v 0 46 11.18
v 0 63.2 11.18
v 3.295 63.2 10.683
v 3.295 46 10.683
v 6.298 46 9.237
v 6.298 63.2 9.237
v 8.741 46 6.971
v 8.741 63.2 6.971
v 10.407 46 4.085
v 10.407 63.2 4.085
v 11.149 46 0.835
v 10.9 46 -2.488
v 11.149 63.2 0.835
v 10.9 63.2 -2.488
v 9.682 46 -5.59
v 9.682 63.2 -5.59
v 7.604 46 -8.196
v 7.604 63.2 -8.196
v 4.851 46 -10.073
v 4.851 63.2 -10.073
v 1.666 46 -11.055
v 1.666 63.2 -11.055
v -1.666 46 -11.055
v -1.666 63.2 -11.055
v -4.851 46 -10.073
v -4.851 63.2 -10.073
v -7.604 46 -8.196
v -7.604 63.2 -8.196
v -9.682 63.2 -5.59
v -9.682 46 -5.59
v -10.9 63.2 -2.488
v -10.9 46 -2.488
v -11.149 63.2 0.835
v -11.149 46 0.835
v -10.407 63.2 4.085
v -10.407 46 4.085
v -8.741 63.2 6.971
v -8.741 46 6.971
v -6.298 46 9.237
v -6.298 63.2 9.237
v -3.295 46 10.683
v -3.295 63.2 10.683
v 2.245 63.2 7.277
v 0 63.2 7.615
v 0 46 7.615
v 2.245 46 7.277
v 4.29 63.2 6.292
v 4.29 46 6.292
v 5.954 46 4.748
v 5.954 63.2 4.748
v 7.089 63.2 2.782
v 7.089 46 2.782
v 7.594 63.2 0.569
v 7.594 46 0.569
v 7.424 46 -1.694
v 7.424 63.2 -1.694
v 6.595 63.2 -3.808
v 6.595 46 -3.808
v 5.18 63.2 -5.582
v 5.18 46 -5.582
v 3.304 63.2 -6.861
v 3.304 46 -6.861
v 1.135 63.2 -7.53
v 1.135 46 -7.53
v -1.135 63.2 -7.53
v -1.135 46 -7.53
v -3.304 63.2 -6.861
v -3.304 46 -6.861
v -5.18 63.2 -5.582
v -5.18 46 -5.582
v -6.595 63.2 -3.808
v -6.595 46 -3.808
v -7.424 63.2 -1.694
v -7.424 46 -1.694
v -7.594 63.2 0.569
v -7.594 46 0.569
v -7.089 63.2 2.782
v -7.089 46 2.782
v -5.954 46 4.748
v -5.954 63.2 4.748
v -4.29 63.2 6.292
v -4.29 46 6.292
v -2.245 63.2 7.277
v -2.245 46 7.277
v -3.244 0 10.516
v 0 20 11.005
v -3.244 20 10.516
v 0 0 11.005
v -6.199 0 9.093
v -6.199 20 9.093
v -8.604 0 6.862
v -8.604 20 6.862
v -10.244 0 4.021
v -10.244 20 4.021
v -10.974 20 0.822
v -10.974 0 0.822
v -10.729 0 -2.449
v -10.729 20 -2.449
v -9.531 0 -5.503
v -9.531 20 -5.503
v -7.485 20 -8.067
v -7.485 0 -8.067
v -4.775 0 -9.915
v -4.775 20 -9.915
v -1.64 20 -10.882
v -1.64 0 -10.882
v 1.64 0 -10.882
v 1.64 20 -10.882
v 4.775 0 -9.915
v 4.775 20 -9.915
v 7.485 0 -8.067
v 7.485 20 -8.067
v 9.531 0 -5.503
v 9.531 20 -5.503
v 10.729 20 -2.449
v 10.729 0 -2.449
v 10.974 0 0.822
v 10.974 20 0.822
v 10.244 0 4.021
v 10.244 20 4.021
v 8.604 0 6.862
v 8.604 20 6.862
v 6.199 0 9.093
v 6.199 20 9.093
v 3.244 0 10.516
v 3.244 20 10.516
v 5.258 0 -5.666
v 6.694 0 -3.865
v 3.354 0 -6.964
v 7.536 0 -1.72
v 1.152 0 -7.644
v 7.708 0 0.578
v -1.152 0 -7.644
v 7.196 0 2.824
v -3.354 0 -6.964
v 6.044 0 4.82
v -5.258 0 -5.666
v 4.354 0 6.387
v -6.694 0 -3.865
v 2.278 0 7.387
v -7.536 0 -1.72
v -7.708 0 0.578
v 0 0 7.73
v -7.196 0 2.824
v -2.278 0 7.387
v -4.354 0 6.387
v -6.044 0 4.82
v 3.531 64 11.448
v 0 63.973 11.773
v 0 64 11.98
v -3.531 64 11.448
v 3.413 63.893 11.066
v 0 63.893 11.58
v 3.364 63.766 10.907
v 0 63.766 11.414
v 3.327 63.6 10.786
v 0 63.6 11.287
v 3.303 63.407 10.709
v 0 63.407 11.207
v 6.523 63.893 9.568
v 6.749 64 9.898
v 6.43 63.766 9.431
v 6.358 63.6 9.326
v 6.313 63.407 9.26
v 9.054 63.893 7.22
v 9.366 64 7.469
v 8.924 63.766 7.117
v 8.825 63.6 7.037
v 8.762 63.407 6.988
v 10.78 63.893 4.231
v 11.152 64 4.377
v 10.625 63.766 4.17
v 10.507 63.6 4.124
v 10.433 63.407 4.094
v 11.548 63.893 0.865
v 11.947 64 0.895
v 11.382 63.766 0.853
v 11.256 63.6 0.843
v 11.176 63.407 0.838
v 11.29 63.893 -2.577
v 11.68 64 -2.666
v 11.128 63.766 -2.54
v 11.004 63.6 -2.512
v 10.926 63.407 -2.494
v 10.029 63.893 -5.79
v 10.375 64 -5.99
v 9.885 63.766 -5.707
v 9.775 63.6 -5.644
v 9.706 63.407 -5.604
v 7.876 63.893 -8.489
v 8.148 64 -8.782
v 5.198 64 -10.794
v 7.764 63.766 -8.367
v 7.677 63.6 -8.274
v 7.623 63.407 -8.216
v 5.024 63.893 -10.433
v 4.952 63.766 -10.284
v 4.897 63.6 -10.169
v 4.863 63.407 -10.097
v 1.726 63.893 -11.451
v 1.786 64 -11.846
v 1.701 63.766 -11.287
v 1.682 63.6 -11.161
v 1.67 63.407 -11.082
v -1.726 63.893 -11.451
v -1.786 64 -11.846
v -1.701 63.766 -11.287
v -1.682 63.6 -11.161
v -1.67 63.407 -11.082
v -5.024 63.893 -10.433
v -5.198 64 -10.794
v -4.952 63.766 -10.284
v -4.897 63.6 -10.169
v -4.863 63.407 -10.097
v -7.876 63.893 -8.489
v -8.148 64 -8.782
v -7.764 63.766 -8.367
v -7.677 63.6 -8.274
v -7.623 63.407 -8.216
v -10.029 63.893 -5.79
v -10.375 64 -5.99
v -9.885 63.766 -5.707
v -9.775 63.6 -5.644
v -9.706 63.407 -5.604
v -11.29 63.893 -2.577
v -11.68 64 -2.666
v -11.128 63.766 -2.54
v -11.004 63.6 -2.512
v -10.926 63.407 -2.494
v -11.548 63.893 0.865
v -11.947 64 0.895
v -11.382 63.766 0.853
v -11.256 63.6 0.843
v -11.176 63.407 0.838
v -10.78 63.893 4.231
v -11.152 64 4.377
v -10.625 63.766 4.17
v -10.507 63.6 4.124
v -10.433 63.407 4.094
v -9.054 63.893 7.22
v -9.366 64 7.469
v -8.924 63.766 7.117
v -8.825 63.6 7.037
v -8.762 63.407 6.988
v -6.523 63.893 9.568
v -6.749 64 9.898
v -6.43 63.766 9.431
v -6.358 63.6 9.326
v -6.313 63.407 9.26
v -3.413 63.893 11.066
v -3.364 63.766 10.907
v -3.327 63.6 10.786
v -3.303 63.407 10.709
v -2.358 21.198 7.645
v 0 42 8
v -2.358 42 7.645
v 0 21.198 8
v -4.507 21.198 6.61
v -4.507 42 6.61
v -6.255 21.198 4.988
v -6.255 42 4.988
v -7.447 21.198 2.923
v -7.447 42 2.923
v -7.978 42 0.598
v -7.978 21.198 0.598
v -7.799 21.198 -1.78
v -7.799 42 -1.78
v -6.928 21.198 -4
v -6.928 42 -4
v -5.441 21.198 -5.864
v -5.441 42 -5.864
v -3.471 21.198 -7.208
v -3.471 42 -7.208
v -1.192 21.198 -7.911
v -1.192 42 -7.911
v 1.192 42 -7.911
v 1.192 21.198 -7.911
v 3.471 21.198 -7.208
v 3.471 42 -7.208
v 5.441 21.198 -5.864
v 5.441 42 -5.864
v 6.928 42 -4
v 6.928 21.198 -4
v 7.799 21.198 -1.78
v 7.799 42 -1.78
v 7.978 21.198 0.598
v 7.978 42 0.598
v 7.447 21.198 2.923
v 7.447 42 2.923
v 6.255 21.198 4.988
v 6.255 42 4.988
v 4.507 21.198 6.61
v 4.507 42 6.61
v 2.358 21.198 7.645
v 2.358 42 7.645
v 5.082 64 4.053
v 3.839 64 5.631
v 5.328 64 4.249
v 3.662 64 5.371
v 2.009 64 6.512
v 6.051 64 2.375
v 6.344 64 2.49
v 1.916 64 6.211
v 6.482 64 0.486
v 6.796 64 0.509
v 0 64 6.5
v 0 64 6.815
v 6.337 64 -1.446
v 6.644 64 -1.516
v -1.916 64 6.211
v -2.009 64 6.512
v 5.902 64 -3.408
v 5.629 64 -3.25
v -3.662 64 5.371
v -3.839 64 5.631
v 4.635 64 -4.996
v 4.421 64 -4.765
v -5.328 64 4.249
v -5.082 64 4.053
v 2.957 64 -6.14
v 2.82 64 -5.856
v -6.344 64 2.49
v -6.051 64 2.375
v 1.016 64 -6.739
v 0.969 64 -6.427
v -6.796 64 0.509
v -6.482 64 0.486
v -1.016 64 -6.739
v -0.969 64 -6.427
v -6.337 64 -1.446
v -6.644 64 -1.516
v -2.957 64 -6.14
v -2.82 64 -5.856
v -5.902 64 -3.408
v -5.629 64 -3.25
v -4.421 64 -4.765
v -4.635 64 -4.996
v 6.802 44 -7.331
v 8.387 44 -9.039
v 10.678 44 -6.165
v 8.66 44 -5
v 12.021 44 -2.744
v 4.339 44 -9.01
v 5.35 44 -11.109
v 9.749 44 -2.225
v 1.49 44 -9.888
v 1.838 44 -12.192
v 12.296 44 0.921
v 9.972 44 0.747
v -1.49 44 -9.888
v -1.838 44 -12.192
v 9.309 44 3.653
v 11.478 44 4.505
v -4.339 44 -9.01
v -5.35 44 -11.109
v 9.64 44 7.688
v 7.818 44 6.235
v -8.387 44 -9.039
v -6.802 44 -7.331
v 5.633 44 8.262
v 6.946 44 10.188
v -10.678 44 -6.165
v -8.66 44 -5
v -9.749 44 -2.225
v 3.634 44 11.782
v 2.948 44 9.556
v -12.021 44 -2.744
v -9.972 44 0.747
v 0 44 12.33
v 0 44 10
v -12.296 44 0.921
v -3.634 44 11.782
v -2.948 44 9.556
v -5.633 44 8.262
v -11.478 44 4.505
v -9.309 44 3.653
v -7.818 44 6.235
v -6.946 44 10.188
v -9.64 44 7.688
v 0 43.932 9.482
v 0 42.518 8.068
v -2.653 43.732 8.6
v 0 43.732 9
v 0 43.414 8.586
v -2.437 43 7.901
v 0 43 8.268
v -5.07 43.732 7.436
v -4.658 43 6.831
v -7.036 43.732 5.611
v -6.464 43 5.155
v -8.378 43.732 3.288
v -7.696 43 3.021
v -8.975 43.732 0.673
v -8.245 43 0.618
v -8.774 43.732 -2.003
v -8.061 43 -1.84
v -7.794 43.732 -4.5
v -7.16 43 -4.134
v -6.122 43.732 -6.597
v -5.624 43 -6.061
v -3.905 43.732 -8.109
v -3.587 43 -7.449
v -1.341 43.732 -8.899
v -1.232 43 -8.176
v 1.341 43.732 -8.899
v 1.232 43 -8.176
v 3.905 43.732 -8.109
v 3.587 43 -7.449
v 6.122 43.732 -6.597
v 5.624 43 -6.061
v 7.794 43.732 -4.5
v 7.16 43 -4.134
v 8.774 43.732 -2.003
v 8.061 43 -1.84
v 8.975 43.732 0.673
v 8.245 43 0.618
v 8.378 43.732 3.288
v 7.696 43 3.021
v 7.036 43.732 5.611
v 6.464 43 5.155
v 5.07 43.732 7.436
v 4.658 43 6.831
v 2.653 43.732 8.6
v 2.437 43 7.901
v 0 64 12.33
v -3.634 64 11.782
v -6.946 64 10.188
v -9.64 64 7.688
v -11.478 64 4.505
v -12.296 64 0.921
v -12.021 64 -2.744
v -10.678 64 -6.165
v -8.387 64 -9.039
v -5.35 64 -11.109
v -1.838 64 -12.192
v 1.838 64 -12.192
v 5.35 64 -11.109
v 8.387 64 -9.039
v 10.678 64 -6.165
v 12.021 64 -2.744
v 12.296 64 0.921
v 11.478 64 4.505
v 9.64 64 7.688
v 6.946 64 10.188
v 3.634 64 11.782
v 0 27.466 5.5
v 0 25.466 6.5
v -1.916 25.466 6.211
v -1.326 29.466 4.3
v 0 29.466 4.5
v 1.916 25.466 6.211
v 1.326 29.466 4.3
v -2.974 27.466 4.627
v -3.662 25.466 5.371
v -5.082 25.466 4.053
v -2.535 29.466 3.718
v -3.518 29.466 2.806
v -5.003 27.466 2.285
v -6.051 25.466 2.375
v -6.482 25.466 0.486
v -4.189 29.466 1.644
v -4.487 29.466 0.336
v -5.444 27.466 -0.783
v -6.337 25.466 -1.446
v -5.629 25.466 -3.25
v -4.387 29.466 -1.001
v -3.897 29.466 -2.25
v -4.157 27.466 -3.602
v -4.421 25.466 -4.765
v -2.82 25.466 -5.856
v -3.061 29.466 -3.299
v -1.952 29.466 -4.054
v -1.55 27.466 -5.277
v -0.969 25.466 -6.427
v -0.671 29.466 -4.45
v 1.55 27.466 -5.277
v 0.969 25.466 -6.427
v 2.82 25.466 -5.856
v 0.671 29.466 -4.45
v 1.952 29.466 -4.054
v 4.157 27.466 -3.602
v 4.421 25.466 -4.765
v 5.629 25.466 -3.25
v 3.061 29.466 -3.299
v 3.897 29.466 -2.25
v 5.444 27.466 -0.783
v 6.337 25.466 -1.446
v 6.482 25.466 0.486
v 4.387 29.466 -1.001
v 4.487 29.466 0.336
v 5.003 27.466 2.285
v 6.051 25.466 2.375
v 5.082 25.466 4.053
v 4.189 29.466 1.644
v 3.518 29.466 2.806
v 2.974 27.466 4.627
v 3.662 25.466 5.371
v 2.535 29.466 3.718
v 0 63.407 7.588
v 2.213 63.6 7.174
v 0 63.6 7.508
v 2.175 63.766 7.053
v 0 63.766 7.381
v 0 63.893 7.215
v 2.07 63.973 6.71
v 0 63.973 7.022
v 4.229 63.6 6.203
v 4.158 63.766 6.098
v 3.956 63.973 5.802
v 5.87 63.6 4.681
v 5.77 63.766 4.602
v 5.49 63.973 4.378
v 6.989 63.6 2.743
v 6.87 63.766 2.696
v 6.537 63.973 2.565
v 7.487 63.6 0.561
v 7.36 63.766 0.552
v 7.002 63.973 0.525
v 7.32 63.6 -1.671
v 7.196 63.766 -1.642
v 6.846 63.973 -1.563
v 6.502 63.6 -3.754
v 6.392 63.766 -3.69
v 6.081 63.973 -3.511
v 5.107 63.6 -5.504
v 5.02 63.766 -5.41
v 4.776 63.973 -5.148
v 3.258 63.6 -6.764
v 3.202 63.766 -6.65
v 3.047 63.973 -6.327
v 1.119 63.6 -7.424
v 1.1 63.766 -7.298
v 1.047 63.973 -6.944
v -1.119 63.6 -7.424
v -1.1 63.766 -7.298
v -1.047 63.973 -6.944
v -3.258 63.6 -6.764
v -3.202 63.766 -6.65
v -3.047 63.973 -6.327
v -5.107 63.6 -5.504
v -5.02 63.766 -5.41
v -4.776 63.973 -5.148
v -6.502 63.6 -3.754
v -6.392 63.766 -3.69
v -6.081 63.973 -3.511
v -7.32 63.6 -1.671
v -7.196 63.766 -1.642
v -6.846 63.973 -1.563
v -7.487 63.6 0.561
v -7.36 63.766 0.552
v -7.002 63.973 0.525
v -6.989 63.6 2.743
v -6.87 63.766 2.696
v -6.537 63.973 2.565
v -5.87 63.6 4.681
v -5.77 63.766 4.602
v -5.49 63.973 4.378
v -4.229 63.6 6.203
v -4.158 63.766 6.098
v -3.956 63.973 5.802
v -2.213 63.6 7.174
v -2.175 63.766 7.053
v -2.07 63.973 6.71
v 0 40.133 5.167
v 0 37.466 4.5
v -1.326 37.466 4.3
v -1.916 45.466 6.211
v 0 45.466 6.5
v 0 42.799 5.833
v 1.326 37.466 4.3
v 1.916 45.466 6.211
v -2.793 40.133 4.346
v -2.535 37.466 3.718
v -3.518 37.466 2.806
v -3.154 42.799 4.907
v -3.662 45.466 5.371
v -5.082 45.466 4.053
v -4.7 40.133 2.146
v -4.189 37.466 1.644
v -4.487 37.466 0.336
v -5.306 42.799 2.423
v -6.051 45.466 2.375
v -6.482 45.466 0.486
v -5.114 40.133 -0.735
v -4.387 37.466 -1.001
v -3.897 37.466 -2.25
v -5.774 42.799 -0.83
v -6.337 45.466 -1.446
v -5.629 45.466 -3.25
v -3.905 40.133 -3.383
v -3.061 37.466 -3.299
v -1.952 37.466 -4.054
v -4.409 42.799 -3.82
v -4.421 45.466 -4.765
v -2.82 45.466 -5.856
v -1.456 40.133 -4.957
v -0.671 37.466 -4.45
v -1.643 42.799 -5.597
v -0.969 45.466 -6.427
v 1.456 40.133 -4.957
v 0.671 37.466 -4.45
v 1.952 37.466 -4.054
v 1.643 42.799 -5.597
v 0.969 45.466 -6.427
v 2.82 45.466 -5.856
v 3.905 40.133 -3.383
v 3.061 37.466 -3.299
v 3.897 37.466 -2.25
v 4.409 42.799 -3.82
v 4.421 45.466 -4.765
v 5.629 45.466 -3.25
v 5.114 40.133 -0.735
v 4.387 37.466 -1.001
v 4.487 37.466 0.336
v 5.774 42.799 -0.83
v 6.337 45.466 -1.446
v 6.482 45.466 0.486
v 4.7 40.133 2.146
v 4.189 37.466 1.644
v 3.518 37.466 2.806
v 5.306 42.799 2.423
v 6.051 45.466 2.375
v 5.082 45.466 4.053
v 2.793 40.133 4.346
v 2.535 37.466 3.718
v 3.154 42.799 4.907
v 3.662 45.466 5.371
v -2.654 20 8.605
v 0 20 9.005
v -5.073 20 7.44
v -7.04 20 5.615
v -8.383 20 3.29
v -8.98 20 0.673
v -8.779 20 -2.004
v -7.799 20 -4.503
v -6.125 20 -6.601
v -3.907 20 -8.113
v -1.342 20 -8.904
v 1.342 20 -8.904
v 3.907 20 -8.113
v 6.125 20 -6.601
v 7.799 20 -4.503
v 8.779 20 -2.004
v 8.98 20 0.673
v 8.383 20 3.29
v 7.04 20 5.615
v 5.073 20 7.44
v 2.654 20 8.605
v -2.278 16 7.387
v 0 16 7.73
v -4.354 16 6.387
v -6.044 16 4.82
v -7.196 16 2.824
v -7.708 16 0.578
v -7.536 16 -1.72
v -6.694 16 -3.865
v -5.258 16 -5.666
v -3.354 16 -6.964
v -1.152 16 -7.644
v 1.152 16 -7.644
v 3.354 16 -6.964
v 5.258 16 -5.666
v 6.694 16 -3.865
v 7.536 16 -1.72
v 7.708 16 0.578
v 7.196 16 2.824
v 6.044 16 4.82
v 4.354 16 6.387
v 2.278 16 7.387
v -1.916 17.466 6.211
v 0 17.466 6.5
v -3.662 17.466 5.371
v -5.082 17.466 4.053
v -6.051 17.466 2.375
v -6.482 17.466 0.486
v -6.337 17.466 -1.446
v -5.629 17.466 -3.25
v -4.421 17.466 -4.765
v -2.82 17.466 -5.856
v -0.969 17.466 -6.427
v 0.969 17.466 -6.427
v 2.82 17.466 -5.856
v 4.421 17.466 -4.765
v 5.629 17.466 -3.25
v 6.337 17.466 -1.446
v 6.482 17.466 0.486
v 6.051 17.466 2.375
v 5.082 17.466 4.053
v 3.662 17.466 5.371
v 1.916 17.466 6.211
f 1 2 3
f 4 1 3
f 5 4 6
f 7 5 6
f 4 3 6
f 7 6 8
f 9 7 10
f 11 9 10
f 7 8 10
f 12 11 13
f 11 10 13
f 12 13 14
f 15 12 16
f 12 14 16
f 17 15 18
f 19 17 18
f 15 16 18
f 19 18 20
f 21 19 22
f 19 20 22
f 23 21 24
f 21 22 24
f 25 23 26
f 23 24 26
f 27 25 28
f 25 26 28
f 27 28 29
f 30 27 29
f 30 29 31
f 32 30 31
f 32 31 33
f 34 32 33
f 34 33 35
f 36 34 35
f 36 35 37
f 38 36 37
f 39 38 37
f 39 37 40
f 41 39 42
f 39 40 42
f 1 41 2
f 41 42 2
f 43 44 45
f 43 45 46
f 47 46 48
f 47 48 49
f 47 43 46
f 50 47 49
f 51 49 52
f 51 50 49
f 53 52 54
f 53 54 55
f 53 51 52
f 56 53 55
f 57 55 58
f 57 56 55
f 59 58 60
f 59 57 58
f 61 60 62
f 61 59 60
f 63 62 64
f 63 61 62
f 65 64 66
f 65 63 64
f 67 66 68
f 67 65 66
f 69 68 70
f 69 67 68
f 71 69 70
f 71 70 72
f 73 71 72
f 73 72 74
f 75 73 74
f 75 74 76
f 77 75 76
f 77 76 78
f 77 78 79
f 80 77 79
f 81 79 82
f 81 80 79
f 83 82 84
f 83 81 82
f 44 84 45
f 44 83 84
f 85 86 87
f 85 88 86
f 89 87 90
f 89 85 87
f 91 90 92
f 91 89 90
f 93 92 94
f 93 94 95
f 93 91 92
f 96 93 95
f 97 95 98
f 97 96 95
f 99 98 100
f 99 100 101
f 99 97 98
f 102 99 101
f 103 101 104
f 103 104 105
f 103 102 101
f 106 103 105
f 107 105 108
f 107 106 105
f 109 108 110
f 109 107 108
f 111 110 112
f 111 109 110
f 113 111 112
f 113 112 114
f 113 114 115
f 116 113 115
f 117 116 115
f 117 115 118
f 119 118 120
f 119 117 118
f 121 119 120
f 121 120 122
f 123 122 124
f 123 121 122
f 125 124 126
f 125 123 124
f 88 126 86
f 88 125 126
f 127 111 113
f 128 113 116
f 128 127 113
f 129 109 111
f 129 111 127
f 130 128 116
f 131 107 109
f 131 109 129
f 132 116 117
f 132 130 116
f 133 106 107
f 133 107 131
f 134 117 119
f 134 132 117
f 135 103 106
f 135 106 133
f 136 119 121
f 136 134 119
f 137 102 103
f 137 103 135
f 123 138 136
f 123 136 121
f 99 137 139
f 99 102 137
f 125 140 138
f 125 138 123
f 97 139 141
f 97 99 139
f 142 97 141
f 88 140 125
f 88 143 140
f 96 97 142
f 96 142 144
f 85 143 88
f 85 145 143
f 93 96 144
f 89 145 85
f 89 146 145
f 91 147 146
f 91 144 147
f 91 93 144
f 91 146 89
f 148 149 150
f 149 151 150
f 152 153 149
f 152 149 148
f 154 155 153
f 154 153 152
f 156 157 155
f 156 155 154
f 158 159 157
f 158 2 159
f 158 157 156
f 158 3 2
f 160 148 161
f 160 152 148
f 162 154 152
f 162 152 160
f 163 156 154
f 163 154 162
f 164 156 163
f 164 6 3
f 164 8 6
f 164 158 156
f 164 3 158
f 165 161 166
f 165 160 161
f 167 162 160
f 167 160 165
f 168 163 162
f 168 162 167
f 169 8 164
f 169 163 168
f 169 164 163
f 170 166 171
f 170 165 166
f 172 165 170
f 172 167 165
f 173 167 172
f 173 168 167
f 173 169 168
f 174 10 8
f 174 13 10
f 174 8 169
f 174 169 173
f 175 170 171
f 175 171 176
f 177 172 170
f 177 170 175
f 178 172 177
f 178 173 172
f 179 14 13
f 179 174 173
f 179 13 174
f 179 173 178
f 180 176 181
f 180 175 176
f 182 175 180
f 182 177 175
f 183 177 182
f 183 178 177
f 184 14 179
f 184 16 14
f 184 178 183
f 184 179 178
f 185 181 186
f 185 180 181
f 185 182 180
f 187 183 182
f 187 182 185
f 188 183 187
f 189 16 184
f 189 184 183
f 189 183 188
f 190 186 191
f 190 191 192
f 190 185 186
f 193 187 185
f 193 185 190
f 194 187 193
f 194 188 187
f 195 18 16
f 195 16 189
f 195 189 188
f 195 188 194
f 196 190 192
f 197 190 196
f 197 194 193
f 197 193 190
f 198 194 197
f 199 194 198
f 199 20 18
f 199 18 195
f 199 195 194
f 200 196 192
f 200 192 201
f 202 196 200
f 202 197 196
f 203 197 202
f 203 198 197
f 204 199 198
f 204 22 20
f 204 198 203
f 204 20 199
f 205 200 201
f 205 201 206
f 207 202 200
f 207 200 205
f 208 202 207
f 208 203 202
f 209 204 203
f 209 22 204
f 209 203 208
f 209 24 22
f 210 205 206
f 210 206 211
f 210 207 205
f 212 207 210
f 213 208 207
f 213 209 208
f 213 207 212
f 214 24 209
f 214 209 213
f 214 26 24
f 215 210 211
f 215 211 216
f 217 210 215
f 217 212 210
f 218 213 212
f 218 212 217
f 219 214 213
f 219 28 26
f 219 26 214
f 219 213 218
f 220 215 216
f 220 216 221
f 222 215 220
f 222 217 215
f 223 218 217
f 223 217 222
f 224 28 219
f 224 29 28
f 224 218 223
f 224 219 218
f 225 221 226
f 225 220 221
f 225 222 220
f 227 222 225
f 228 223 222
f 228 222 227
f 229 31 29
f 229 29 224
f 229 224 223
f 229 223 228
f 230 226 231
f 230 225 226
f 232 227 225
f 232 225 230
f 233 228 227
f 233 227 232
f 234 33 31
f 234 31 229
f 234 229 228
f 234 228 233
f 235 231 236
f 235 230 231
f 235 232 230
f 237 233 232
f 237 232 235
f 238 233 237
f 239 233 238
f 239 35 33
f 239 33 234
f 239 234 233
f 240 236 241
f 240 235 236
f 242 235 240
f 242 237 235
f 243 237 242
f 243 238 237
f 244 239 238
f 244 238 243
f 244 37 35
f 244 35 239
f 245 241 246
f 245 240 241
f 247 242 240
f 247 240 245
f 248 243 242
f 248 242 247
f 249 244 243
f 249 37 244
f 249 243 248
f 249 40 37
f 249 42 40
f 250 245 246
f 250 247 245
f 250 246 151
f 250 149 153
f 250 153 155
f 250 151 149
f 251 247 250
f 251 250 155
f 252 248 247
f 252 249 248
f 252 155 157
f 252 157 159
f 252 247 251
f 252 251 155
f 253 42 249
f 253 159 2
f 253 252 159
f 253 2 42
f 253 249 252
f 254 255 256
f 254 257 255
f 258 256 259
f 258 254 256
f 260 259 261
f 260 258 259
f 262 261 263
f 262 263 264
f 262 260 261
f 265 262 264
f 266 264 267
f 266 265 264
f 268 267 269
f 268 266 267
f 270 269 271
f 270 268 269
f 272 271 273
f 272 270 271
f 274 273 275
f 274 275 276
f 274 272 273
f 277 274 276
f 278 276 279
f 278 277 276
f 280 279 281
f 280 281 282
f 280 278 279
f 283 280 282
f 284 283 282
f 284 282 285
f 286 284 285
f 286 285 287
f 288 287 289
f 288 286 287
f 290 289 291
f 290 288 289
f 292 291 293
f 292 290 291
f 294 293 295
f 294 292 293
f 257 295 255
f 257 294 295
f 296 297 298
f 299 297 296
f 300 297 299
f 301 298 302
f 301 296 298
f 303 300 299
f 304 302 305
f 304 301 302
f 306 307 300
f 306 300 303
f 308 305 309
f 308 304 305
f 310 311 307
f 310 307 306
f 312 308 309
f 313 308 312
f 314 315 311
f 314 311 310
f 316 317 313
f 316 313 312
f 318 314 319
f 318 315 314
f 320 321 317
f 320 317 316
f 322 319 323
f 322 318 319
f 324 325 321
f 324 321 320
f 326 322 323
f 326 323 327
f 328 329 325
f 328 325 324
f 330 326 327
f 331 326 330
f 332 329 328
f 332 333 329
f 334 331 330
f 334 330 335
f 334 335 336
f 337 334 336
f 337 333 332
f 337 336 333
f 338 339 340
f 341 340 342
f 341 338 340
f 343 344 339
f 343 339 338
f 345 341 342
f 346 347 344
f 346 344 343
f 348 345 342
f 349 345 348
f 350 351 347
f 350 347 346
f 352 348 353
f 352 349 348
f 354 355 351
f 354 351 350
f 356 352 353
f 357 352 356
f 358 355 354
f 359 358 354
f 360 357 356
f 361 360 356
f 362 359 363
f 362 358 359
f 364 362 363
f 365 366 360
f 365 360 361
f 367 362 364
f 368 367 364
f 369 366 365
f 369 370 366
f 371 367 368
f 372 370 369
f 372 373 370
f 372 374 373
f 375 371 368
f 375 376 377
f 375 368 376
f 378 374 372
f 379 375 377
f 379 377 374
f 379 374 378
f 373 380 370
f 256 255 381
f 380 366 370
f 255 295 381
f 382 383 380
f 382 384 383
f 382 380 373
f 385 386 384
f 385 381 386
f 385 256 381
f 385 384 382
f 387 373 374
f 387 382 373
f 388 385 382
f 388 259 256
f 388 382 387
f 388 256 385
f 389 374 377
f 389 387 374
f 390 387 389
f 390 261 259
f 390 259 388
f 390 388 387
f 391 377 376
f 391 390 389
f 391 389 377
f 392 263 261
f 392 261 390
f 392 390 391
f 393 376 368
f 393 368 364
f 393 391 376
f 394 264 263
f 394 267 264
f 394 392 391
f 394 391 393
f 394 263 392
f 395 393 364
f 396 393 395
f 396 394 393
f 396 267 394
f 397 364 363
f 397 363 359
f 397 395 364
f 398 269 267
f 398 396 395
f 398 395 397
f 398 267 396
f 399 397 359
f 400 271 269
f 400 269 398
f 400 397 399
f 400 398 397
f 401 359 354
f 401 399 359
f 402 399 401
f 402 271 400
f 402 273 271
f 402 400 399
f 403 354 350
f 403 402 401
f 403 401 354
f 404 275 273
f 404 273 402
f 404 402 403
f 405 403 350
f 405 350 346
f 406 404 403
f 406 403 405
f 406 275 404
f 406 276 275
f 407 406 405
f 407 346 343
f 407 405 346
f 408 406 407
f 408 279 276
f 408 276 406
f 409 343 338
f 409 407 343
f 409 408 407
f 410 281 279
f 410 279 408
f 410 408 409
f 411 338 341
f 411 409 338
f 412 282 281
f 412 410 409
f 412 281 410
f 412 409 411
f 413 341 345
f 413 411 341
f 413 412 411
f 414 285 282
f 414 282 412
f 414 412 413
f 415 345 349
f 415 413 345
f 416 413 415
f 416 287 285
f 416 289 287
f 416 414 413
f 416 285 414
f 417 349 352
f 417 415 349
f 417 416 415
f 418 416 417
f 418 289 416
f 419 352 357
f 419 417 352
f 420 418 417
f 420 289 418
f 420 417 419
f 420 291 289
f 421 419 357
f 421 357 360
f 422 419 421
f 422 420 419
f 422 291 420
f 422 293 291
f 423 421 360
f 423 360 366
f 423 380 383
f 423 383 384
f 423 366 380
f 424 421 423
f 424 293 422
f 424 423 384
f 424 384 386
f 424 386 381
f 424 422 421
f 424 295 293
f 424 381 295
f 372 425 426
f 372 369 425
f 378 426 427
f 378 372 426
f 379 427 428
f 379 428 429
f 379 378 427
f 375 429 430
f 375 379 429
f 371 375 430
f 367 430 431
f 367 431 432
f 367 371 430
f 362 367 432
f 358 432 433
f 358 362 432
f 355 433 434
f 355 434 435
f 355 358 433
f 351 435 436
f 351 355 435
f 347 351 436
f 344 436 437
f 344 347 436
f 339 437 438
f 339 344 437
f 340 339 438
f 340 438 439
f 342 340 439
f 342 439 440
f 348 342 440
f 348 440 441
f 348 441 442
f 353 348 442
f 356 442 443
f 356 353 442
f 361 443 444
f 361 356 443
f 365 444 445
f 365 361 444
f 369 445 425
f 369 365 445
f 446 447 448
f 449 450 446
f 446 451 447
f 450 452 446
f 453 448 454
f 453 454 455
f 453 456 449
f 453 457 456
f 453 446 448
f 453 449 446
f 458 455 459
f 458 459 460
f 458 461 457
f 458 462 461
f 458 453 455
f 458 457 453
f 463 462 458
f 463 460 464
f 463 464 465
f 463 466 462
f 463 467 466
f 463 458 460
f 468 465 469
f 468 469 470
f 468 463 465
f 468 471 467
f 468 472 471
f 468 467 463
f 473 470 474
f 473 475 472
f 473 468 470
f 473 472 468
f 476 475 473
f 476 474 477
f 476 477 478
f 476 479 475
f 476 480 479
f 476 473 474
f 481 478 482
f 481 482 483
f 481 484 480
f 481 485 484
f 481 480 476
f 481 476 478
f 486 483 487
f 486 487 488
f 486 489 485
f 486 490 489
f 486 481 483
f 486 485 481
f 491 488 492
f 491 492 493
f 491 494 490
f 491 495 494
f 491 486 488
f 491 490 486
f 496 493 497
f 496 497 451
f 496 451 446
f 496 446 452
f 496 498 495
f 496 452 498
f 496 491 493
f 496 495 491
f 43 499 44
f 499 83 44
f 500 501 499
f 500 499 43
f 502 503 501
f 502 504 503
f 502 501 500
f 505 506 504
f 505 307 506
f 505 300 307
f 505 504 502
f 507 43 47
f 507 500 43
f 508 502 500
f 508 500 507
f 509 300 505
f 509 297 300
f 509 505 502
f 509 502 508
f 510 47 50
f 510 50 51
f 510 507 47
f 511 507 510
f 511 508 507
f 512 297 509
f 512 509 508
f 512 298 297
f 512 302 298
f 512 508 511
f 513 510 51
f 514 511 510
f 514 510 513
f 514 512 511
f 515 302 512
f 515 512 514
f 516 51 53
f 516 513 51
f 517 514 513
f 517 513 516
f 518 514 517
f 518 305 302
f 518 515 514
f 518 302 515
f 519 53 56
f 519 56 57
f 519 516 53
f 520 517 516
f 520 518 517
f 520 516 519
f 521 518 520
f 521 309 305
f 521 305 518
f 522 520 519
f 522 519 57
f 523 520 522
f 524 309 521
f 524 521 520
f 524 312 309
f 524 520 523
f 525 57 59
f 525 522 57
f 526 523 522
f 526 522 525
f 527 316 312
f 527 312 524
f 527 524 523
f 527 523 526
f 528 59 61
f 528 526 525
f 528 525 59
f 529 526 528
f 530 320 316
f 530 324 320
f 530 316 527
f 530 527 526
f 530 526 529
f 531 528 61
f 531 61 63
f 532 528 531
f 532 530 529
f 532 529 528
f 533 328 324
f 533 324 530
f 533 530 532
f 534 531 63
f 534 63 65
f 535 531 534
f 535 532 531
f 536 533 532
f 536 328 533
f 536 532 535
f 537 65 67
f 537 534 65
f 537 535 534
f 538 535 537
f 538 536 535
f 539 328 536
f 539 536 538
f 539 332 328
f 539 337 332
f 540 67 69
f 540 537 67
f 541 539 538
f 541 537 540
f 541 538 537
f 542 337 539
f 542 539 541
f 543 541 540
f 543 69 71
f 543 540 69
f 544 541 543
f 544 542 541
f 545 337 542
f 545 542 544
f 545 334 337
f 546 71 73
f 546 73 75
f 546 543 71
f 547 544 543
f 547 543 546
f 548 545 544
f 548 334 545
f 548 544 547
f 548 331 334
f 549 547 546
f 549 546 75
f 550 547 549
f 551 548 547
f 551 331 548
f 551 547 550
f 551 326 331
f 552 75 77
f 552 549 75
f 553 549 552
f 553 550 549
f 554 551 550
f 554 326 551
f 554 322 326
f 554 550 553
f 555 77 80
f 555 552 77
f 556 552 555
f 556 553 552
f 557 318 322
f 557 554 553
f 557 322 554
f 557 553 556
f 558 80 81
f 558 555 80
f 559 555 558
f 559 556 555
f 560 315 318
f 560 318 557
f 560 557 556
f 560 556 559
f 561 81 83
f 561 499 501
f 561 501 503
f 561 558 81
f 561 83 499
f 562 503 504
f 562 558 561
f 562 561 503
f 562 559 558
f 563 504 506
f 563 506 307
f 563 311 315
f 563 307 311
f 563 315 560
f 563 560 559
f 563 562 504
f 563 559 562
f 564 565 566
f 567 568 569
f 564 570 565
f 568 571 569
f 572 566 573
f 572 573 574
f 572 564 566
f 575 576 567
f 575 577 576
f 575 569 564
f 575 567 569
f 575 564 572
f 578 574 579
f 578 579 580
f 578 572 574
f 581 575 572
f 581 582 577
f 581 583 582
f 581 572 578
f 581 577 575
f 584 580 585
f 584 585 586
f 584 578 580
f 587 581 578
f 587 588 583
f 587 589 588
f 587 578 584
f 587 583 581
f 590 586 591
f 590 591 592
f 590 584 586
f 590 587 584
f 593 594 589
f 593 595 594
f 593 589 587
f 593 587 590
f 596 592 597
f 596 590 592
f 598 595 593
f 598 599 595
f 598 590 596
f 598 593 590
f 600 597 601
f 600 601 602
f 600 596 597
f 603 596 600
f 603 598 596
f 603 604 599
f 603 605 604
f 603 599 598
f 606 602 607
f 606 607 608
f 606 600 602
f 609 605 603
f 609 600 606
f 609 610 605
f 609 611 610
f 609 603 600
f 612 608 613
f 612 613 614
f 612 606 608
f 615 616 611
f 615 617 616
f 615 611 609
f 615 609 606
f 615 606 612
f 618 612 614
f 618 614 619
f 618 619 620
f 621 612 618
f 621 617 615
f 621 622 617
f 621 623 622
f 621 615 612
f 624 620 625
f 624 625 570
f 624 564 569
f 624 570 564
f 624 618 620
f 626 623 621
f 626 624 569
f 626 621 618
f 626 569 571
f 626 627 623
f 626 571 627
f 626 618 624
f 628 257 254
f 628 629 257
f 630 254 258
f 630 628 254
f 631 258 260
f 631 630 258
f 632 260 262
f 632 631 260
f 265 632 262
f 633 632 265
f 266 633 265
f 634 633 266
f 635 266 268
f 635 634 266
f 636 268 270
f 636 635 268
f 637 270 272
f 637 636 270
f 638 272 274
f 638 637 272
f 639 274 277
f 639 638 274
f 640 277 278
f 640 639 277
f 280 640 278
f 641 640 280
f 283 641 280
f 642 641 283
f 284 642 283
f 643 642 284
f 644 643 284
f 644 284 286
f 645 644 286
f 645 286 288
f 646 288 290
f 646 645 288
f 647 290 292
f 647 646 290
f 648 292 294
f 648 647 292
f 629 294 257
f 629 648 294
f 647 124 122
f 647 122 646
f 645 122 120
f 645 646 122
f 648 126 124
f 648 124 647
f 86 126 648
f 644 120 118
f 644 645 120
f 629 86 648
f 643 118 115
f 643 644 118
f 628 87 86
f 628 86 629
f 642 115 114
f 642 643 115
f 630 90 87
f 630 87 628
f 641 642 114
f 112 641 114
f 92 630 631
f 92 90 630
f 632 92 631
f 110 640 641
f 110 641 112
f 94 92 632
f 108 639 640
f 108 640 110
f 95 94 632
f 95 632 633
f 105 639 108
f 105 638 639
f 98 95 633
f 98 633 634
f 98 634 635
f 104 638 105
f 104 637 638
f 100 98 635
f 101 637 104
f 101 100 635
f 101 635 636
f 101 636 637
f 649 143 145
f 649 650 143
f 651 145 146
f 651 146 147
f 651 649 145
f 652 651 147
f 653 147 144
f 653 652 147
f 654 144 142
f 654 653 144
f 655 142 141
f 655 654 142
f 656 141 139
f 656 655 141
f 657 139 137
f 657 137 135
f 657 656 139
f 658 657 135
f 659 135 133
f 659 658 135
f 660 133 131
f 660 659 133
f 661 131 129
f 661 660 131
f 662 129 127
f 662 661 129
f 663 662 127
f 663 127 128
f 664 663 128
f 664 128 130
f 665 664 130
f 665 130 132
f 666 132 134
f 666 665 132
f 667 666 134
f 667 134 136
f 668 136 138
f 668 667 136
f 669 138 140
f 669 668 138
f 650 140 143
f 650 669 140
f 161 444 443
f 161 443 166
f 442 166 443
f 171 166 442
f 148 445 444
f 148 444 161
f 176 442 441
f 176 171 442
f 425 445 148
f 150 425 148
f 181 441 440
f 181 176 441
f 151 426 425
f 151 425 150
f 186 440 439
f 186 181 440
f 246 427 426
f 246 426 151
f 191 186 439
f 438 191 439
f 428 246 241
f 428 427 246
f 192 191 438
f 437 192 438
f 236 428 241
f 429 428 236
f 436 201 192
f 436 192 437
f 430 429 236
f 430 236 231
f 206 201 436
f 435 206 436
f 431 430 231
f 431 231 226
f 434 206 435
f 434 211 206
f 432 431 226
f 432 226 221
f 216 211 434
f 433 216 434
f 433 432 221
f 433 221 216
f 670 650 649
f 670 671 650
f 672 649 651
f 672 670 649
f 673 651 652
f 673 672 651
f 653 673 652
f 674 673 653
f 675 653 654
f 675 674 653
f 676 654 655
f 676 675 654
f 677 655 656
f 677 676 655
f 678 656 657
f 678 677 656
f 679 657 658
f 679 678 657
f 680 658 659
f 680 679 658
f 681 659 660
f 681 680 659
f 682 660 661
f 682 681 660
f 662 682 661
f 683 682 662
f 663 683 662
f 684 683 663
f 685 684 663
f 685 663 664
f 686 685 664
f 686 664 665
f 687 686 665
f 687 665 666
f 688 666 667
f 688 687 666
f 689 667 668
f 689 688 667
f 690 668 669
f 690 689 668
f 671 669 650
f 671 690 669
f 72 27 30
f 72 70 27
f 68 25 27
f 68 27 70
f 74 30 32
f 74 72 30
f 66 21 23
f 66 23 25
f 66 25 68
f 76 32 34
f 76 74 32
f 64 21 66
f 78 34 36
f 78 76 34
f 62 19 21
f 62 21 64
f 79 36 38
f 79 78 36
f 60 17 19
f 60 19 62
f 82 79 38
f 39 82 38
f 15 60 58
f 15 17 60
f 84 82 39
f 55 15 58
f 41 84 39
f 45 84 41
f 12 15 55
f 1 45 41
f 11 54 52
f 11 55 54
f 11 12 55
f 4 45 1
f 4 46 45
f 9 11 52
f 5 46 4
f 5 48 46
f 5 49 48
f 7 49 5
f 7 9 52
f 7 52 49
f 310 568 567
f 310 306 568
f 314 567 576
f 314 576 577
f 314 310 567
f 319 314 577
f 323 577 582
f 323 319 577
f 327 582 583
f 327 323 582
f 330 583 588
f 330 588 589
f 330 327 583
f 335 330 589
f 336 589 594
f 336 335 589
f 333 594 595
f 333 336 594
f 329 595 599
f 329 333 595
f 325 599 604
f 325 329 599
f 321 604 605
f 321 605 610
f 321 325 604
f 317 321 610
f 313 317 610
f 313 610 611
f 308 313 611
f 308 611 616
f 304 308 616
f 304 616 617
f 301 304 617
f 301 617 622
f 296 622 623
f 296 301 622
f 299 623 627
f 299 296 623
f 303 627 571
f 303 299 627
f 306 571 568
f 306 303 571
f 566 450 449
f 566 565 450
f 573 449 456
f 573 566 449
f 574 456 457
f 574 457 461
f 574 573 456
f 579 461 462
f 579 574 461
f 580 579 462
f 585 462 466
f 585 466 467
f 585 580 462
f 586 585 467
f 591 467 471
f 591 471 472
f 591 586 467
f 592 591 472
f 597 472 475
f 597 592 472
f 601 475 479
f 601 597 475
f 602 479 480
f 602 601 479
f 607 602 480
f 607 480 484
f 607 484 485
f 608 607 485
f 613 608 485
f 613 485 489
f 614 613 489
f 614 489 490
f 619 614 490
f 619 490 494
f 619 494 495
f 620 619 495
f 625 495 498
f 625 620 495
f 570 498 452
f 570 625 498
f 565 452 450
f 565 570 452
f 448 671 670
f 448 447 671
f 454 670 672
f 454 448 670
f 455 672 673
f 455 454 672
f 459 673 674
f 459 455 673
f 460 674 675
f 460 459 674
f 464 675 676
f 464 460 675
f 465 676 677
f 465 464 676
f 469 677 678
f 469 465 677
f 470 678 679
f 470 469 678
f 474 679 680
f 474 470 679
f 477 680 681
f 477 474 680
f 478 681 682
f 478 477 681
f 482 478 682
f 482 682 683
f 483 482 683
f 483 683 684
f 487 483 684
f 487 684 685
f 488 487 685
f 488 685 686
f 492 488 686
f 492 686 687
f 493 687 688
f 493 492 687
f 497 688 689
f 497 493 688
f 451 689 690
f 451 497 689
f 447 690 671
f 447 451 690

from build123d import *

# Parameters (mm, degrees)
SKETCH2_R          = 11.18
SKETCH2_R_2        = 7.615
CUT_EXTRUDE1_DEPTH = 18
FILLET1_R          = 0.8


with BuildPart() as part:
    # Sketch1 → Revolve1 (revolve)
    with BuildSketch(Plane(origin=(0, 0, 0), x_dir=(0, 0, -1), z_dir=(1, 0, 0)), mode=Mode.PRIVATE) as revolve1_sk:
        with BuildLine():
            Line((12.33, 64), (12.33, 44))
            Line((12.33, 44), (10, 44))
            ThreePointArc((10, 44), (8.585786438, 43.414213562), (8, 42))
            Line((8, 42), (8, 21.197712361))
            Line((8, 21.197712361), (9.005, 20))
            Line((9.005, 20), (11.005, 20))
            Line((11.005, 20), (11.005, 0))
            Line((11.005, 0), (7.73, 0))
            Line((7.73, 0), (7.73, 16))
            Line((7.73, 16), (6.5, 17.465856919))
            Line((6.5, 17.465856919), (6.5, 25.465856919))
            Line((6.5, 25.465856919), (4.5, 29.465856919))
            Line((4.5, 29.465856919), (4.5, 37.465856919))
            Line((4.5, 37.465856919), (6.5, 45.465856919))
            Line((6.5, 45.465856919), (6.5, 64))
            Line((6.5, 64), (12.33, 64))
        make_face()
    revolve(revolve1_sk.sketch.rotate(Axis((0, 34.050123762, 0), (0, -1, 0)), 180), axis=Axis((0, 34.050123762, 0), (0, -1, 0)))

    # Sketch2 → Cut-Extrude1 (cut)
    with BuildSketch(Plane(origin=(0, 64, 0), x_dir=(1, 0, 0), z_dir=(0, 1, 0))):
        with Locations(Location((0, 0, 0), (0, 0, 270))):
            Circle(SKETCH2_R)
        with Locations(Location((0, 0, 0), (0, 0, 270))):
            Circle(SKETCH2_R_2, mode=Mode.SUBTRACT)
    extrude(amount=-CUT_EXTRUDE1_DEPTH, mode=Mode.SUBTRACT)

    # Fillet1
    fillet1_edges = [part.edges().sort_by_distance(p)[0] for p in [
        (0, 64, -11.18),
        (0, 64, -7.615),
    ]]
    fillet(fillet1_edges, radius=FILLET1_R)


solid = part.part
